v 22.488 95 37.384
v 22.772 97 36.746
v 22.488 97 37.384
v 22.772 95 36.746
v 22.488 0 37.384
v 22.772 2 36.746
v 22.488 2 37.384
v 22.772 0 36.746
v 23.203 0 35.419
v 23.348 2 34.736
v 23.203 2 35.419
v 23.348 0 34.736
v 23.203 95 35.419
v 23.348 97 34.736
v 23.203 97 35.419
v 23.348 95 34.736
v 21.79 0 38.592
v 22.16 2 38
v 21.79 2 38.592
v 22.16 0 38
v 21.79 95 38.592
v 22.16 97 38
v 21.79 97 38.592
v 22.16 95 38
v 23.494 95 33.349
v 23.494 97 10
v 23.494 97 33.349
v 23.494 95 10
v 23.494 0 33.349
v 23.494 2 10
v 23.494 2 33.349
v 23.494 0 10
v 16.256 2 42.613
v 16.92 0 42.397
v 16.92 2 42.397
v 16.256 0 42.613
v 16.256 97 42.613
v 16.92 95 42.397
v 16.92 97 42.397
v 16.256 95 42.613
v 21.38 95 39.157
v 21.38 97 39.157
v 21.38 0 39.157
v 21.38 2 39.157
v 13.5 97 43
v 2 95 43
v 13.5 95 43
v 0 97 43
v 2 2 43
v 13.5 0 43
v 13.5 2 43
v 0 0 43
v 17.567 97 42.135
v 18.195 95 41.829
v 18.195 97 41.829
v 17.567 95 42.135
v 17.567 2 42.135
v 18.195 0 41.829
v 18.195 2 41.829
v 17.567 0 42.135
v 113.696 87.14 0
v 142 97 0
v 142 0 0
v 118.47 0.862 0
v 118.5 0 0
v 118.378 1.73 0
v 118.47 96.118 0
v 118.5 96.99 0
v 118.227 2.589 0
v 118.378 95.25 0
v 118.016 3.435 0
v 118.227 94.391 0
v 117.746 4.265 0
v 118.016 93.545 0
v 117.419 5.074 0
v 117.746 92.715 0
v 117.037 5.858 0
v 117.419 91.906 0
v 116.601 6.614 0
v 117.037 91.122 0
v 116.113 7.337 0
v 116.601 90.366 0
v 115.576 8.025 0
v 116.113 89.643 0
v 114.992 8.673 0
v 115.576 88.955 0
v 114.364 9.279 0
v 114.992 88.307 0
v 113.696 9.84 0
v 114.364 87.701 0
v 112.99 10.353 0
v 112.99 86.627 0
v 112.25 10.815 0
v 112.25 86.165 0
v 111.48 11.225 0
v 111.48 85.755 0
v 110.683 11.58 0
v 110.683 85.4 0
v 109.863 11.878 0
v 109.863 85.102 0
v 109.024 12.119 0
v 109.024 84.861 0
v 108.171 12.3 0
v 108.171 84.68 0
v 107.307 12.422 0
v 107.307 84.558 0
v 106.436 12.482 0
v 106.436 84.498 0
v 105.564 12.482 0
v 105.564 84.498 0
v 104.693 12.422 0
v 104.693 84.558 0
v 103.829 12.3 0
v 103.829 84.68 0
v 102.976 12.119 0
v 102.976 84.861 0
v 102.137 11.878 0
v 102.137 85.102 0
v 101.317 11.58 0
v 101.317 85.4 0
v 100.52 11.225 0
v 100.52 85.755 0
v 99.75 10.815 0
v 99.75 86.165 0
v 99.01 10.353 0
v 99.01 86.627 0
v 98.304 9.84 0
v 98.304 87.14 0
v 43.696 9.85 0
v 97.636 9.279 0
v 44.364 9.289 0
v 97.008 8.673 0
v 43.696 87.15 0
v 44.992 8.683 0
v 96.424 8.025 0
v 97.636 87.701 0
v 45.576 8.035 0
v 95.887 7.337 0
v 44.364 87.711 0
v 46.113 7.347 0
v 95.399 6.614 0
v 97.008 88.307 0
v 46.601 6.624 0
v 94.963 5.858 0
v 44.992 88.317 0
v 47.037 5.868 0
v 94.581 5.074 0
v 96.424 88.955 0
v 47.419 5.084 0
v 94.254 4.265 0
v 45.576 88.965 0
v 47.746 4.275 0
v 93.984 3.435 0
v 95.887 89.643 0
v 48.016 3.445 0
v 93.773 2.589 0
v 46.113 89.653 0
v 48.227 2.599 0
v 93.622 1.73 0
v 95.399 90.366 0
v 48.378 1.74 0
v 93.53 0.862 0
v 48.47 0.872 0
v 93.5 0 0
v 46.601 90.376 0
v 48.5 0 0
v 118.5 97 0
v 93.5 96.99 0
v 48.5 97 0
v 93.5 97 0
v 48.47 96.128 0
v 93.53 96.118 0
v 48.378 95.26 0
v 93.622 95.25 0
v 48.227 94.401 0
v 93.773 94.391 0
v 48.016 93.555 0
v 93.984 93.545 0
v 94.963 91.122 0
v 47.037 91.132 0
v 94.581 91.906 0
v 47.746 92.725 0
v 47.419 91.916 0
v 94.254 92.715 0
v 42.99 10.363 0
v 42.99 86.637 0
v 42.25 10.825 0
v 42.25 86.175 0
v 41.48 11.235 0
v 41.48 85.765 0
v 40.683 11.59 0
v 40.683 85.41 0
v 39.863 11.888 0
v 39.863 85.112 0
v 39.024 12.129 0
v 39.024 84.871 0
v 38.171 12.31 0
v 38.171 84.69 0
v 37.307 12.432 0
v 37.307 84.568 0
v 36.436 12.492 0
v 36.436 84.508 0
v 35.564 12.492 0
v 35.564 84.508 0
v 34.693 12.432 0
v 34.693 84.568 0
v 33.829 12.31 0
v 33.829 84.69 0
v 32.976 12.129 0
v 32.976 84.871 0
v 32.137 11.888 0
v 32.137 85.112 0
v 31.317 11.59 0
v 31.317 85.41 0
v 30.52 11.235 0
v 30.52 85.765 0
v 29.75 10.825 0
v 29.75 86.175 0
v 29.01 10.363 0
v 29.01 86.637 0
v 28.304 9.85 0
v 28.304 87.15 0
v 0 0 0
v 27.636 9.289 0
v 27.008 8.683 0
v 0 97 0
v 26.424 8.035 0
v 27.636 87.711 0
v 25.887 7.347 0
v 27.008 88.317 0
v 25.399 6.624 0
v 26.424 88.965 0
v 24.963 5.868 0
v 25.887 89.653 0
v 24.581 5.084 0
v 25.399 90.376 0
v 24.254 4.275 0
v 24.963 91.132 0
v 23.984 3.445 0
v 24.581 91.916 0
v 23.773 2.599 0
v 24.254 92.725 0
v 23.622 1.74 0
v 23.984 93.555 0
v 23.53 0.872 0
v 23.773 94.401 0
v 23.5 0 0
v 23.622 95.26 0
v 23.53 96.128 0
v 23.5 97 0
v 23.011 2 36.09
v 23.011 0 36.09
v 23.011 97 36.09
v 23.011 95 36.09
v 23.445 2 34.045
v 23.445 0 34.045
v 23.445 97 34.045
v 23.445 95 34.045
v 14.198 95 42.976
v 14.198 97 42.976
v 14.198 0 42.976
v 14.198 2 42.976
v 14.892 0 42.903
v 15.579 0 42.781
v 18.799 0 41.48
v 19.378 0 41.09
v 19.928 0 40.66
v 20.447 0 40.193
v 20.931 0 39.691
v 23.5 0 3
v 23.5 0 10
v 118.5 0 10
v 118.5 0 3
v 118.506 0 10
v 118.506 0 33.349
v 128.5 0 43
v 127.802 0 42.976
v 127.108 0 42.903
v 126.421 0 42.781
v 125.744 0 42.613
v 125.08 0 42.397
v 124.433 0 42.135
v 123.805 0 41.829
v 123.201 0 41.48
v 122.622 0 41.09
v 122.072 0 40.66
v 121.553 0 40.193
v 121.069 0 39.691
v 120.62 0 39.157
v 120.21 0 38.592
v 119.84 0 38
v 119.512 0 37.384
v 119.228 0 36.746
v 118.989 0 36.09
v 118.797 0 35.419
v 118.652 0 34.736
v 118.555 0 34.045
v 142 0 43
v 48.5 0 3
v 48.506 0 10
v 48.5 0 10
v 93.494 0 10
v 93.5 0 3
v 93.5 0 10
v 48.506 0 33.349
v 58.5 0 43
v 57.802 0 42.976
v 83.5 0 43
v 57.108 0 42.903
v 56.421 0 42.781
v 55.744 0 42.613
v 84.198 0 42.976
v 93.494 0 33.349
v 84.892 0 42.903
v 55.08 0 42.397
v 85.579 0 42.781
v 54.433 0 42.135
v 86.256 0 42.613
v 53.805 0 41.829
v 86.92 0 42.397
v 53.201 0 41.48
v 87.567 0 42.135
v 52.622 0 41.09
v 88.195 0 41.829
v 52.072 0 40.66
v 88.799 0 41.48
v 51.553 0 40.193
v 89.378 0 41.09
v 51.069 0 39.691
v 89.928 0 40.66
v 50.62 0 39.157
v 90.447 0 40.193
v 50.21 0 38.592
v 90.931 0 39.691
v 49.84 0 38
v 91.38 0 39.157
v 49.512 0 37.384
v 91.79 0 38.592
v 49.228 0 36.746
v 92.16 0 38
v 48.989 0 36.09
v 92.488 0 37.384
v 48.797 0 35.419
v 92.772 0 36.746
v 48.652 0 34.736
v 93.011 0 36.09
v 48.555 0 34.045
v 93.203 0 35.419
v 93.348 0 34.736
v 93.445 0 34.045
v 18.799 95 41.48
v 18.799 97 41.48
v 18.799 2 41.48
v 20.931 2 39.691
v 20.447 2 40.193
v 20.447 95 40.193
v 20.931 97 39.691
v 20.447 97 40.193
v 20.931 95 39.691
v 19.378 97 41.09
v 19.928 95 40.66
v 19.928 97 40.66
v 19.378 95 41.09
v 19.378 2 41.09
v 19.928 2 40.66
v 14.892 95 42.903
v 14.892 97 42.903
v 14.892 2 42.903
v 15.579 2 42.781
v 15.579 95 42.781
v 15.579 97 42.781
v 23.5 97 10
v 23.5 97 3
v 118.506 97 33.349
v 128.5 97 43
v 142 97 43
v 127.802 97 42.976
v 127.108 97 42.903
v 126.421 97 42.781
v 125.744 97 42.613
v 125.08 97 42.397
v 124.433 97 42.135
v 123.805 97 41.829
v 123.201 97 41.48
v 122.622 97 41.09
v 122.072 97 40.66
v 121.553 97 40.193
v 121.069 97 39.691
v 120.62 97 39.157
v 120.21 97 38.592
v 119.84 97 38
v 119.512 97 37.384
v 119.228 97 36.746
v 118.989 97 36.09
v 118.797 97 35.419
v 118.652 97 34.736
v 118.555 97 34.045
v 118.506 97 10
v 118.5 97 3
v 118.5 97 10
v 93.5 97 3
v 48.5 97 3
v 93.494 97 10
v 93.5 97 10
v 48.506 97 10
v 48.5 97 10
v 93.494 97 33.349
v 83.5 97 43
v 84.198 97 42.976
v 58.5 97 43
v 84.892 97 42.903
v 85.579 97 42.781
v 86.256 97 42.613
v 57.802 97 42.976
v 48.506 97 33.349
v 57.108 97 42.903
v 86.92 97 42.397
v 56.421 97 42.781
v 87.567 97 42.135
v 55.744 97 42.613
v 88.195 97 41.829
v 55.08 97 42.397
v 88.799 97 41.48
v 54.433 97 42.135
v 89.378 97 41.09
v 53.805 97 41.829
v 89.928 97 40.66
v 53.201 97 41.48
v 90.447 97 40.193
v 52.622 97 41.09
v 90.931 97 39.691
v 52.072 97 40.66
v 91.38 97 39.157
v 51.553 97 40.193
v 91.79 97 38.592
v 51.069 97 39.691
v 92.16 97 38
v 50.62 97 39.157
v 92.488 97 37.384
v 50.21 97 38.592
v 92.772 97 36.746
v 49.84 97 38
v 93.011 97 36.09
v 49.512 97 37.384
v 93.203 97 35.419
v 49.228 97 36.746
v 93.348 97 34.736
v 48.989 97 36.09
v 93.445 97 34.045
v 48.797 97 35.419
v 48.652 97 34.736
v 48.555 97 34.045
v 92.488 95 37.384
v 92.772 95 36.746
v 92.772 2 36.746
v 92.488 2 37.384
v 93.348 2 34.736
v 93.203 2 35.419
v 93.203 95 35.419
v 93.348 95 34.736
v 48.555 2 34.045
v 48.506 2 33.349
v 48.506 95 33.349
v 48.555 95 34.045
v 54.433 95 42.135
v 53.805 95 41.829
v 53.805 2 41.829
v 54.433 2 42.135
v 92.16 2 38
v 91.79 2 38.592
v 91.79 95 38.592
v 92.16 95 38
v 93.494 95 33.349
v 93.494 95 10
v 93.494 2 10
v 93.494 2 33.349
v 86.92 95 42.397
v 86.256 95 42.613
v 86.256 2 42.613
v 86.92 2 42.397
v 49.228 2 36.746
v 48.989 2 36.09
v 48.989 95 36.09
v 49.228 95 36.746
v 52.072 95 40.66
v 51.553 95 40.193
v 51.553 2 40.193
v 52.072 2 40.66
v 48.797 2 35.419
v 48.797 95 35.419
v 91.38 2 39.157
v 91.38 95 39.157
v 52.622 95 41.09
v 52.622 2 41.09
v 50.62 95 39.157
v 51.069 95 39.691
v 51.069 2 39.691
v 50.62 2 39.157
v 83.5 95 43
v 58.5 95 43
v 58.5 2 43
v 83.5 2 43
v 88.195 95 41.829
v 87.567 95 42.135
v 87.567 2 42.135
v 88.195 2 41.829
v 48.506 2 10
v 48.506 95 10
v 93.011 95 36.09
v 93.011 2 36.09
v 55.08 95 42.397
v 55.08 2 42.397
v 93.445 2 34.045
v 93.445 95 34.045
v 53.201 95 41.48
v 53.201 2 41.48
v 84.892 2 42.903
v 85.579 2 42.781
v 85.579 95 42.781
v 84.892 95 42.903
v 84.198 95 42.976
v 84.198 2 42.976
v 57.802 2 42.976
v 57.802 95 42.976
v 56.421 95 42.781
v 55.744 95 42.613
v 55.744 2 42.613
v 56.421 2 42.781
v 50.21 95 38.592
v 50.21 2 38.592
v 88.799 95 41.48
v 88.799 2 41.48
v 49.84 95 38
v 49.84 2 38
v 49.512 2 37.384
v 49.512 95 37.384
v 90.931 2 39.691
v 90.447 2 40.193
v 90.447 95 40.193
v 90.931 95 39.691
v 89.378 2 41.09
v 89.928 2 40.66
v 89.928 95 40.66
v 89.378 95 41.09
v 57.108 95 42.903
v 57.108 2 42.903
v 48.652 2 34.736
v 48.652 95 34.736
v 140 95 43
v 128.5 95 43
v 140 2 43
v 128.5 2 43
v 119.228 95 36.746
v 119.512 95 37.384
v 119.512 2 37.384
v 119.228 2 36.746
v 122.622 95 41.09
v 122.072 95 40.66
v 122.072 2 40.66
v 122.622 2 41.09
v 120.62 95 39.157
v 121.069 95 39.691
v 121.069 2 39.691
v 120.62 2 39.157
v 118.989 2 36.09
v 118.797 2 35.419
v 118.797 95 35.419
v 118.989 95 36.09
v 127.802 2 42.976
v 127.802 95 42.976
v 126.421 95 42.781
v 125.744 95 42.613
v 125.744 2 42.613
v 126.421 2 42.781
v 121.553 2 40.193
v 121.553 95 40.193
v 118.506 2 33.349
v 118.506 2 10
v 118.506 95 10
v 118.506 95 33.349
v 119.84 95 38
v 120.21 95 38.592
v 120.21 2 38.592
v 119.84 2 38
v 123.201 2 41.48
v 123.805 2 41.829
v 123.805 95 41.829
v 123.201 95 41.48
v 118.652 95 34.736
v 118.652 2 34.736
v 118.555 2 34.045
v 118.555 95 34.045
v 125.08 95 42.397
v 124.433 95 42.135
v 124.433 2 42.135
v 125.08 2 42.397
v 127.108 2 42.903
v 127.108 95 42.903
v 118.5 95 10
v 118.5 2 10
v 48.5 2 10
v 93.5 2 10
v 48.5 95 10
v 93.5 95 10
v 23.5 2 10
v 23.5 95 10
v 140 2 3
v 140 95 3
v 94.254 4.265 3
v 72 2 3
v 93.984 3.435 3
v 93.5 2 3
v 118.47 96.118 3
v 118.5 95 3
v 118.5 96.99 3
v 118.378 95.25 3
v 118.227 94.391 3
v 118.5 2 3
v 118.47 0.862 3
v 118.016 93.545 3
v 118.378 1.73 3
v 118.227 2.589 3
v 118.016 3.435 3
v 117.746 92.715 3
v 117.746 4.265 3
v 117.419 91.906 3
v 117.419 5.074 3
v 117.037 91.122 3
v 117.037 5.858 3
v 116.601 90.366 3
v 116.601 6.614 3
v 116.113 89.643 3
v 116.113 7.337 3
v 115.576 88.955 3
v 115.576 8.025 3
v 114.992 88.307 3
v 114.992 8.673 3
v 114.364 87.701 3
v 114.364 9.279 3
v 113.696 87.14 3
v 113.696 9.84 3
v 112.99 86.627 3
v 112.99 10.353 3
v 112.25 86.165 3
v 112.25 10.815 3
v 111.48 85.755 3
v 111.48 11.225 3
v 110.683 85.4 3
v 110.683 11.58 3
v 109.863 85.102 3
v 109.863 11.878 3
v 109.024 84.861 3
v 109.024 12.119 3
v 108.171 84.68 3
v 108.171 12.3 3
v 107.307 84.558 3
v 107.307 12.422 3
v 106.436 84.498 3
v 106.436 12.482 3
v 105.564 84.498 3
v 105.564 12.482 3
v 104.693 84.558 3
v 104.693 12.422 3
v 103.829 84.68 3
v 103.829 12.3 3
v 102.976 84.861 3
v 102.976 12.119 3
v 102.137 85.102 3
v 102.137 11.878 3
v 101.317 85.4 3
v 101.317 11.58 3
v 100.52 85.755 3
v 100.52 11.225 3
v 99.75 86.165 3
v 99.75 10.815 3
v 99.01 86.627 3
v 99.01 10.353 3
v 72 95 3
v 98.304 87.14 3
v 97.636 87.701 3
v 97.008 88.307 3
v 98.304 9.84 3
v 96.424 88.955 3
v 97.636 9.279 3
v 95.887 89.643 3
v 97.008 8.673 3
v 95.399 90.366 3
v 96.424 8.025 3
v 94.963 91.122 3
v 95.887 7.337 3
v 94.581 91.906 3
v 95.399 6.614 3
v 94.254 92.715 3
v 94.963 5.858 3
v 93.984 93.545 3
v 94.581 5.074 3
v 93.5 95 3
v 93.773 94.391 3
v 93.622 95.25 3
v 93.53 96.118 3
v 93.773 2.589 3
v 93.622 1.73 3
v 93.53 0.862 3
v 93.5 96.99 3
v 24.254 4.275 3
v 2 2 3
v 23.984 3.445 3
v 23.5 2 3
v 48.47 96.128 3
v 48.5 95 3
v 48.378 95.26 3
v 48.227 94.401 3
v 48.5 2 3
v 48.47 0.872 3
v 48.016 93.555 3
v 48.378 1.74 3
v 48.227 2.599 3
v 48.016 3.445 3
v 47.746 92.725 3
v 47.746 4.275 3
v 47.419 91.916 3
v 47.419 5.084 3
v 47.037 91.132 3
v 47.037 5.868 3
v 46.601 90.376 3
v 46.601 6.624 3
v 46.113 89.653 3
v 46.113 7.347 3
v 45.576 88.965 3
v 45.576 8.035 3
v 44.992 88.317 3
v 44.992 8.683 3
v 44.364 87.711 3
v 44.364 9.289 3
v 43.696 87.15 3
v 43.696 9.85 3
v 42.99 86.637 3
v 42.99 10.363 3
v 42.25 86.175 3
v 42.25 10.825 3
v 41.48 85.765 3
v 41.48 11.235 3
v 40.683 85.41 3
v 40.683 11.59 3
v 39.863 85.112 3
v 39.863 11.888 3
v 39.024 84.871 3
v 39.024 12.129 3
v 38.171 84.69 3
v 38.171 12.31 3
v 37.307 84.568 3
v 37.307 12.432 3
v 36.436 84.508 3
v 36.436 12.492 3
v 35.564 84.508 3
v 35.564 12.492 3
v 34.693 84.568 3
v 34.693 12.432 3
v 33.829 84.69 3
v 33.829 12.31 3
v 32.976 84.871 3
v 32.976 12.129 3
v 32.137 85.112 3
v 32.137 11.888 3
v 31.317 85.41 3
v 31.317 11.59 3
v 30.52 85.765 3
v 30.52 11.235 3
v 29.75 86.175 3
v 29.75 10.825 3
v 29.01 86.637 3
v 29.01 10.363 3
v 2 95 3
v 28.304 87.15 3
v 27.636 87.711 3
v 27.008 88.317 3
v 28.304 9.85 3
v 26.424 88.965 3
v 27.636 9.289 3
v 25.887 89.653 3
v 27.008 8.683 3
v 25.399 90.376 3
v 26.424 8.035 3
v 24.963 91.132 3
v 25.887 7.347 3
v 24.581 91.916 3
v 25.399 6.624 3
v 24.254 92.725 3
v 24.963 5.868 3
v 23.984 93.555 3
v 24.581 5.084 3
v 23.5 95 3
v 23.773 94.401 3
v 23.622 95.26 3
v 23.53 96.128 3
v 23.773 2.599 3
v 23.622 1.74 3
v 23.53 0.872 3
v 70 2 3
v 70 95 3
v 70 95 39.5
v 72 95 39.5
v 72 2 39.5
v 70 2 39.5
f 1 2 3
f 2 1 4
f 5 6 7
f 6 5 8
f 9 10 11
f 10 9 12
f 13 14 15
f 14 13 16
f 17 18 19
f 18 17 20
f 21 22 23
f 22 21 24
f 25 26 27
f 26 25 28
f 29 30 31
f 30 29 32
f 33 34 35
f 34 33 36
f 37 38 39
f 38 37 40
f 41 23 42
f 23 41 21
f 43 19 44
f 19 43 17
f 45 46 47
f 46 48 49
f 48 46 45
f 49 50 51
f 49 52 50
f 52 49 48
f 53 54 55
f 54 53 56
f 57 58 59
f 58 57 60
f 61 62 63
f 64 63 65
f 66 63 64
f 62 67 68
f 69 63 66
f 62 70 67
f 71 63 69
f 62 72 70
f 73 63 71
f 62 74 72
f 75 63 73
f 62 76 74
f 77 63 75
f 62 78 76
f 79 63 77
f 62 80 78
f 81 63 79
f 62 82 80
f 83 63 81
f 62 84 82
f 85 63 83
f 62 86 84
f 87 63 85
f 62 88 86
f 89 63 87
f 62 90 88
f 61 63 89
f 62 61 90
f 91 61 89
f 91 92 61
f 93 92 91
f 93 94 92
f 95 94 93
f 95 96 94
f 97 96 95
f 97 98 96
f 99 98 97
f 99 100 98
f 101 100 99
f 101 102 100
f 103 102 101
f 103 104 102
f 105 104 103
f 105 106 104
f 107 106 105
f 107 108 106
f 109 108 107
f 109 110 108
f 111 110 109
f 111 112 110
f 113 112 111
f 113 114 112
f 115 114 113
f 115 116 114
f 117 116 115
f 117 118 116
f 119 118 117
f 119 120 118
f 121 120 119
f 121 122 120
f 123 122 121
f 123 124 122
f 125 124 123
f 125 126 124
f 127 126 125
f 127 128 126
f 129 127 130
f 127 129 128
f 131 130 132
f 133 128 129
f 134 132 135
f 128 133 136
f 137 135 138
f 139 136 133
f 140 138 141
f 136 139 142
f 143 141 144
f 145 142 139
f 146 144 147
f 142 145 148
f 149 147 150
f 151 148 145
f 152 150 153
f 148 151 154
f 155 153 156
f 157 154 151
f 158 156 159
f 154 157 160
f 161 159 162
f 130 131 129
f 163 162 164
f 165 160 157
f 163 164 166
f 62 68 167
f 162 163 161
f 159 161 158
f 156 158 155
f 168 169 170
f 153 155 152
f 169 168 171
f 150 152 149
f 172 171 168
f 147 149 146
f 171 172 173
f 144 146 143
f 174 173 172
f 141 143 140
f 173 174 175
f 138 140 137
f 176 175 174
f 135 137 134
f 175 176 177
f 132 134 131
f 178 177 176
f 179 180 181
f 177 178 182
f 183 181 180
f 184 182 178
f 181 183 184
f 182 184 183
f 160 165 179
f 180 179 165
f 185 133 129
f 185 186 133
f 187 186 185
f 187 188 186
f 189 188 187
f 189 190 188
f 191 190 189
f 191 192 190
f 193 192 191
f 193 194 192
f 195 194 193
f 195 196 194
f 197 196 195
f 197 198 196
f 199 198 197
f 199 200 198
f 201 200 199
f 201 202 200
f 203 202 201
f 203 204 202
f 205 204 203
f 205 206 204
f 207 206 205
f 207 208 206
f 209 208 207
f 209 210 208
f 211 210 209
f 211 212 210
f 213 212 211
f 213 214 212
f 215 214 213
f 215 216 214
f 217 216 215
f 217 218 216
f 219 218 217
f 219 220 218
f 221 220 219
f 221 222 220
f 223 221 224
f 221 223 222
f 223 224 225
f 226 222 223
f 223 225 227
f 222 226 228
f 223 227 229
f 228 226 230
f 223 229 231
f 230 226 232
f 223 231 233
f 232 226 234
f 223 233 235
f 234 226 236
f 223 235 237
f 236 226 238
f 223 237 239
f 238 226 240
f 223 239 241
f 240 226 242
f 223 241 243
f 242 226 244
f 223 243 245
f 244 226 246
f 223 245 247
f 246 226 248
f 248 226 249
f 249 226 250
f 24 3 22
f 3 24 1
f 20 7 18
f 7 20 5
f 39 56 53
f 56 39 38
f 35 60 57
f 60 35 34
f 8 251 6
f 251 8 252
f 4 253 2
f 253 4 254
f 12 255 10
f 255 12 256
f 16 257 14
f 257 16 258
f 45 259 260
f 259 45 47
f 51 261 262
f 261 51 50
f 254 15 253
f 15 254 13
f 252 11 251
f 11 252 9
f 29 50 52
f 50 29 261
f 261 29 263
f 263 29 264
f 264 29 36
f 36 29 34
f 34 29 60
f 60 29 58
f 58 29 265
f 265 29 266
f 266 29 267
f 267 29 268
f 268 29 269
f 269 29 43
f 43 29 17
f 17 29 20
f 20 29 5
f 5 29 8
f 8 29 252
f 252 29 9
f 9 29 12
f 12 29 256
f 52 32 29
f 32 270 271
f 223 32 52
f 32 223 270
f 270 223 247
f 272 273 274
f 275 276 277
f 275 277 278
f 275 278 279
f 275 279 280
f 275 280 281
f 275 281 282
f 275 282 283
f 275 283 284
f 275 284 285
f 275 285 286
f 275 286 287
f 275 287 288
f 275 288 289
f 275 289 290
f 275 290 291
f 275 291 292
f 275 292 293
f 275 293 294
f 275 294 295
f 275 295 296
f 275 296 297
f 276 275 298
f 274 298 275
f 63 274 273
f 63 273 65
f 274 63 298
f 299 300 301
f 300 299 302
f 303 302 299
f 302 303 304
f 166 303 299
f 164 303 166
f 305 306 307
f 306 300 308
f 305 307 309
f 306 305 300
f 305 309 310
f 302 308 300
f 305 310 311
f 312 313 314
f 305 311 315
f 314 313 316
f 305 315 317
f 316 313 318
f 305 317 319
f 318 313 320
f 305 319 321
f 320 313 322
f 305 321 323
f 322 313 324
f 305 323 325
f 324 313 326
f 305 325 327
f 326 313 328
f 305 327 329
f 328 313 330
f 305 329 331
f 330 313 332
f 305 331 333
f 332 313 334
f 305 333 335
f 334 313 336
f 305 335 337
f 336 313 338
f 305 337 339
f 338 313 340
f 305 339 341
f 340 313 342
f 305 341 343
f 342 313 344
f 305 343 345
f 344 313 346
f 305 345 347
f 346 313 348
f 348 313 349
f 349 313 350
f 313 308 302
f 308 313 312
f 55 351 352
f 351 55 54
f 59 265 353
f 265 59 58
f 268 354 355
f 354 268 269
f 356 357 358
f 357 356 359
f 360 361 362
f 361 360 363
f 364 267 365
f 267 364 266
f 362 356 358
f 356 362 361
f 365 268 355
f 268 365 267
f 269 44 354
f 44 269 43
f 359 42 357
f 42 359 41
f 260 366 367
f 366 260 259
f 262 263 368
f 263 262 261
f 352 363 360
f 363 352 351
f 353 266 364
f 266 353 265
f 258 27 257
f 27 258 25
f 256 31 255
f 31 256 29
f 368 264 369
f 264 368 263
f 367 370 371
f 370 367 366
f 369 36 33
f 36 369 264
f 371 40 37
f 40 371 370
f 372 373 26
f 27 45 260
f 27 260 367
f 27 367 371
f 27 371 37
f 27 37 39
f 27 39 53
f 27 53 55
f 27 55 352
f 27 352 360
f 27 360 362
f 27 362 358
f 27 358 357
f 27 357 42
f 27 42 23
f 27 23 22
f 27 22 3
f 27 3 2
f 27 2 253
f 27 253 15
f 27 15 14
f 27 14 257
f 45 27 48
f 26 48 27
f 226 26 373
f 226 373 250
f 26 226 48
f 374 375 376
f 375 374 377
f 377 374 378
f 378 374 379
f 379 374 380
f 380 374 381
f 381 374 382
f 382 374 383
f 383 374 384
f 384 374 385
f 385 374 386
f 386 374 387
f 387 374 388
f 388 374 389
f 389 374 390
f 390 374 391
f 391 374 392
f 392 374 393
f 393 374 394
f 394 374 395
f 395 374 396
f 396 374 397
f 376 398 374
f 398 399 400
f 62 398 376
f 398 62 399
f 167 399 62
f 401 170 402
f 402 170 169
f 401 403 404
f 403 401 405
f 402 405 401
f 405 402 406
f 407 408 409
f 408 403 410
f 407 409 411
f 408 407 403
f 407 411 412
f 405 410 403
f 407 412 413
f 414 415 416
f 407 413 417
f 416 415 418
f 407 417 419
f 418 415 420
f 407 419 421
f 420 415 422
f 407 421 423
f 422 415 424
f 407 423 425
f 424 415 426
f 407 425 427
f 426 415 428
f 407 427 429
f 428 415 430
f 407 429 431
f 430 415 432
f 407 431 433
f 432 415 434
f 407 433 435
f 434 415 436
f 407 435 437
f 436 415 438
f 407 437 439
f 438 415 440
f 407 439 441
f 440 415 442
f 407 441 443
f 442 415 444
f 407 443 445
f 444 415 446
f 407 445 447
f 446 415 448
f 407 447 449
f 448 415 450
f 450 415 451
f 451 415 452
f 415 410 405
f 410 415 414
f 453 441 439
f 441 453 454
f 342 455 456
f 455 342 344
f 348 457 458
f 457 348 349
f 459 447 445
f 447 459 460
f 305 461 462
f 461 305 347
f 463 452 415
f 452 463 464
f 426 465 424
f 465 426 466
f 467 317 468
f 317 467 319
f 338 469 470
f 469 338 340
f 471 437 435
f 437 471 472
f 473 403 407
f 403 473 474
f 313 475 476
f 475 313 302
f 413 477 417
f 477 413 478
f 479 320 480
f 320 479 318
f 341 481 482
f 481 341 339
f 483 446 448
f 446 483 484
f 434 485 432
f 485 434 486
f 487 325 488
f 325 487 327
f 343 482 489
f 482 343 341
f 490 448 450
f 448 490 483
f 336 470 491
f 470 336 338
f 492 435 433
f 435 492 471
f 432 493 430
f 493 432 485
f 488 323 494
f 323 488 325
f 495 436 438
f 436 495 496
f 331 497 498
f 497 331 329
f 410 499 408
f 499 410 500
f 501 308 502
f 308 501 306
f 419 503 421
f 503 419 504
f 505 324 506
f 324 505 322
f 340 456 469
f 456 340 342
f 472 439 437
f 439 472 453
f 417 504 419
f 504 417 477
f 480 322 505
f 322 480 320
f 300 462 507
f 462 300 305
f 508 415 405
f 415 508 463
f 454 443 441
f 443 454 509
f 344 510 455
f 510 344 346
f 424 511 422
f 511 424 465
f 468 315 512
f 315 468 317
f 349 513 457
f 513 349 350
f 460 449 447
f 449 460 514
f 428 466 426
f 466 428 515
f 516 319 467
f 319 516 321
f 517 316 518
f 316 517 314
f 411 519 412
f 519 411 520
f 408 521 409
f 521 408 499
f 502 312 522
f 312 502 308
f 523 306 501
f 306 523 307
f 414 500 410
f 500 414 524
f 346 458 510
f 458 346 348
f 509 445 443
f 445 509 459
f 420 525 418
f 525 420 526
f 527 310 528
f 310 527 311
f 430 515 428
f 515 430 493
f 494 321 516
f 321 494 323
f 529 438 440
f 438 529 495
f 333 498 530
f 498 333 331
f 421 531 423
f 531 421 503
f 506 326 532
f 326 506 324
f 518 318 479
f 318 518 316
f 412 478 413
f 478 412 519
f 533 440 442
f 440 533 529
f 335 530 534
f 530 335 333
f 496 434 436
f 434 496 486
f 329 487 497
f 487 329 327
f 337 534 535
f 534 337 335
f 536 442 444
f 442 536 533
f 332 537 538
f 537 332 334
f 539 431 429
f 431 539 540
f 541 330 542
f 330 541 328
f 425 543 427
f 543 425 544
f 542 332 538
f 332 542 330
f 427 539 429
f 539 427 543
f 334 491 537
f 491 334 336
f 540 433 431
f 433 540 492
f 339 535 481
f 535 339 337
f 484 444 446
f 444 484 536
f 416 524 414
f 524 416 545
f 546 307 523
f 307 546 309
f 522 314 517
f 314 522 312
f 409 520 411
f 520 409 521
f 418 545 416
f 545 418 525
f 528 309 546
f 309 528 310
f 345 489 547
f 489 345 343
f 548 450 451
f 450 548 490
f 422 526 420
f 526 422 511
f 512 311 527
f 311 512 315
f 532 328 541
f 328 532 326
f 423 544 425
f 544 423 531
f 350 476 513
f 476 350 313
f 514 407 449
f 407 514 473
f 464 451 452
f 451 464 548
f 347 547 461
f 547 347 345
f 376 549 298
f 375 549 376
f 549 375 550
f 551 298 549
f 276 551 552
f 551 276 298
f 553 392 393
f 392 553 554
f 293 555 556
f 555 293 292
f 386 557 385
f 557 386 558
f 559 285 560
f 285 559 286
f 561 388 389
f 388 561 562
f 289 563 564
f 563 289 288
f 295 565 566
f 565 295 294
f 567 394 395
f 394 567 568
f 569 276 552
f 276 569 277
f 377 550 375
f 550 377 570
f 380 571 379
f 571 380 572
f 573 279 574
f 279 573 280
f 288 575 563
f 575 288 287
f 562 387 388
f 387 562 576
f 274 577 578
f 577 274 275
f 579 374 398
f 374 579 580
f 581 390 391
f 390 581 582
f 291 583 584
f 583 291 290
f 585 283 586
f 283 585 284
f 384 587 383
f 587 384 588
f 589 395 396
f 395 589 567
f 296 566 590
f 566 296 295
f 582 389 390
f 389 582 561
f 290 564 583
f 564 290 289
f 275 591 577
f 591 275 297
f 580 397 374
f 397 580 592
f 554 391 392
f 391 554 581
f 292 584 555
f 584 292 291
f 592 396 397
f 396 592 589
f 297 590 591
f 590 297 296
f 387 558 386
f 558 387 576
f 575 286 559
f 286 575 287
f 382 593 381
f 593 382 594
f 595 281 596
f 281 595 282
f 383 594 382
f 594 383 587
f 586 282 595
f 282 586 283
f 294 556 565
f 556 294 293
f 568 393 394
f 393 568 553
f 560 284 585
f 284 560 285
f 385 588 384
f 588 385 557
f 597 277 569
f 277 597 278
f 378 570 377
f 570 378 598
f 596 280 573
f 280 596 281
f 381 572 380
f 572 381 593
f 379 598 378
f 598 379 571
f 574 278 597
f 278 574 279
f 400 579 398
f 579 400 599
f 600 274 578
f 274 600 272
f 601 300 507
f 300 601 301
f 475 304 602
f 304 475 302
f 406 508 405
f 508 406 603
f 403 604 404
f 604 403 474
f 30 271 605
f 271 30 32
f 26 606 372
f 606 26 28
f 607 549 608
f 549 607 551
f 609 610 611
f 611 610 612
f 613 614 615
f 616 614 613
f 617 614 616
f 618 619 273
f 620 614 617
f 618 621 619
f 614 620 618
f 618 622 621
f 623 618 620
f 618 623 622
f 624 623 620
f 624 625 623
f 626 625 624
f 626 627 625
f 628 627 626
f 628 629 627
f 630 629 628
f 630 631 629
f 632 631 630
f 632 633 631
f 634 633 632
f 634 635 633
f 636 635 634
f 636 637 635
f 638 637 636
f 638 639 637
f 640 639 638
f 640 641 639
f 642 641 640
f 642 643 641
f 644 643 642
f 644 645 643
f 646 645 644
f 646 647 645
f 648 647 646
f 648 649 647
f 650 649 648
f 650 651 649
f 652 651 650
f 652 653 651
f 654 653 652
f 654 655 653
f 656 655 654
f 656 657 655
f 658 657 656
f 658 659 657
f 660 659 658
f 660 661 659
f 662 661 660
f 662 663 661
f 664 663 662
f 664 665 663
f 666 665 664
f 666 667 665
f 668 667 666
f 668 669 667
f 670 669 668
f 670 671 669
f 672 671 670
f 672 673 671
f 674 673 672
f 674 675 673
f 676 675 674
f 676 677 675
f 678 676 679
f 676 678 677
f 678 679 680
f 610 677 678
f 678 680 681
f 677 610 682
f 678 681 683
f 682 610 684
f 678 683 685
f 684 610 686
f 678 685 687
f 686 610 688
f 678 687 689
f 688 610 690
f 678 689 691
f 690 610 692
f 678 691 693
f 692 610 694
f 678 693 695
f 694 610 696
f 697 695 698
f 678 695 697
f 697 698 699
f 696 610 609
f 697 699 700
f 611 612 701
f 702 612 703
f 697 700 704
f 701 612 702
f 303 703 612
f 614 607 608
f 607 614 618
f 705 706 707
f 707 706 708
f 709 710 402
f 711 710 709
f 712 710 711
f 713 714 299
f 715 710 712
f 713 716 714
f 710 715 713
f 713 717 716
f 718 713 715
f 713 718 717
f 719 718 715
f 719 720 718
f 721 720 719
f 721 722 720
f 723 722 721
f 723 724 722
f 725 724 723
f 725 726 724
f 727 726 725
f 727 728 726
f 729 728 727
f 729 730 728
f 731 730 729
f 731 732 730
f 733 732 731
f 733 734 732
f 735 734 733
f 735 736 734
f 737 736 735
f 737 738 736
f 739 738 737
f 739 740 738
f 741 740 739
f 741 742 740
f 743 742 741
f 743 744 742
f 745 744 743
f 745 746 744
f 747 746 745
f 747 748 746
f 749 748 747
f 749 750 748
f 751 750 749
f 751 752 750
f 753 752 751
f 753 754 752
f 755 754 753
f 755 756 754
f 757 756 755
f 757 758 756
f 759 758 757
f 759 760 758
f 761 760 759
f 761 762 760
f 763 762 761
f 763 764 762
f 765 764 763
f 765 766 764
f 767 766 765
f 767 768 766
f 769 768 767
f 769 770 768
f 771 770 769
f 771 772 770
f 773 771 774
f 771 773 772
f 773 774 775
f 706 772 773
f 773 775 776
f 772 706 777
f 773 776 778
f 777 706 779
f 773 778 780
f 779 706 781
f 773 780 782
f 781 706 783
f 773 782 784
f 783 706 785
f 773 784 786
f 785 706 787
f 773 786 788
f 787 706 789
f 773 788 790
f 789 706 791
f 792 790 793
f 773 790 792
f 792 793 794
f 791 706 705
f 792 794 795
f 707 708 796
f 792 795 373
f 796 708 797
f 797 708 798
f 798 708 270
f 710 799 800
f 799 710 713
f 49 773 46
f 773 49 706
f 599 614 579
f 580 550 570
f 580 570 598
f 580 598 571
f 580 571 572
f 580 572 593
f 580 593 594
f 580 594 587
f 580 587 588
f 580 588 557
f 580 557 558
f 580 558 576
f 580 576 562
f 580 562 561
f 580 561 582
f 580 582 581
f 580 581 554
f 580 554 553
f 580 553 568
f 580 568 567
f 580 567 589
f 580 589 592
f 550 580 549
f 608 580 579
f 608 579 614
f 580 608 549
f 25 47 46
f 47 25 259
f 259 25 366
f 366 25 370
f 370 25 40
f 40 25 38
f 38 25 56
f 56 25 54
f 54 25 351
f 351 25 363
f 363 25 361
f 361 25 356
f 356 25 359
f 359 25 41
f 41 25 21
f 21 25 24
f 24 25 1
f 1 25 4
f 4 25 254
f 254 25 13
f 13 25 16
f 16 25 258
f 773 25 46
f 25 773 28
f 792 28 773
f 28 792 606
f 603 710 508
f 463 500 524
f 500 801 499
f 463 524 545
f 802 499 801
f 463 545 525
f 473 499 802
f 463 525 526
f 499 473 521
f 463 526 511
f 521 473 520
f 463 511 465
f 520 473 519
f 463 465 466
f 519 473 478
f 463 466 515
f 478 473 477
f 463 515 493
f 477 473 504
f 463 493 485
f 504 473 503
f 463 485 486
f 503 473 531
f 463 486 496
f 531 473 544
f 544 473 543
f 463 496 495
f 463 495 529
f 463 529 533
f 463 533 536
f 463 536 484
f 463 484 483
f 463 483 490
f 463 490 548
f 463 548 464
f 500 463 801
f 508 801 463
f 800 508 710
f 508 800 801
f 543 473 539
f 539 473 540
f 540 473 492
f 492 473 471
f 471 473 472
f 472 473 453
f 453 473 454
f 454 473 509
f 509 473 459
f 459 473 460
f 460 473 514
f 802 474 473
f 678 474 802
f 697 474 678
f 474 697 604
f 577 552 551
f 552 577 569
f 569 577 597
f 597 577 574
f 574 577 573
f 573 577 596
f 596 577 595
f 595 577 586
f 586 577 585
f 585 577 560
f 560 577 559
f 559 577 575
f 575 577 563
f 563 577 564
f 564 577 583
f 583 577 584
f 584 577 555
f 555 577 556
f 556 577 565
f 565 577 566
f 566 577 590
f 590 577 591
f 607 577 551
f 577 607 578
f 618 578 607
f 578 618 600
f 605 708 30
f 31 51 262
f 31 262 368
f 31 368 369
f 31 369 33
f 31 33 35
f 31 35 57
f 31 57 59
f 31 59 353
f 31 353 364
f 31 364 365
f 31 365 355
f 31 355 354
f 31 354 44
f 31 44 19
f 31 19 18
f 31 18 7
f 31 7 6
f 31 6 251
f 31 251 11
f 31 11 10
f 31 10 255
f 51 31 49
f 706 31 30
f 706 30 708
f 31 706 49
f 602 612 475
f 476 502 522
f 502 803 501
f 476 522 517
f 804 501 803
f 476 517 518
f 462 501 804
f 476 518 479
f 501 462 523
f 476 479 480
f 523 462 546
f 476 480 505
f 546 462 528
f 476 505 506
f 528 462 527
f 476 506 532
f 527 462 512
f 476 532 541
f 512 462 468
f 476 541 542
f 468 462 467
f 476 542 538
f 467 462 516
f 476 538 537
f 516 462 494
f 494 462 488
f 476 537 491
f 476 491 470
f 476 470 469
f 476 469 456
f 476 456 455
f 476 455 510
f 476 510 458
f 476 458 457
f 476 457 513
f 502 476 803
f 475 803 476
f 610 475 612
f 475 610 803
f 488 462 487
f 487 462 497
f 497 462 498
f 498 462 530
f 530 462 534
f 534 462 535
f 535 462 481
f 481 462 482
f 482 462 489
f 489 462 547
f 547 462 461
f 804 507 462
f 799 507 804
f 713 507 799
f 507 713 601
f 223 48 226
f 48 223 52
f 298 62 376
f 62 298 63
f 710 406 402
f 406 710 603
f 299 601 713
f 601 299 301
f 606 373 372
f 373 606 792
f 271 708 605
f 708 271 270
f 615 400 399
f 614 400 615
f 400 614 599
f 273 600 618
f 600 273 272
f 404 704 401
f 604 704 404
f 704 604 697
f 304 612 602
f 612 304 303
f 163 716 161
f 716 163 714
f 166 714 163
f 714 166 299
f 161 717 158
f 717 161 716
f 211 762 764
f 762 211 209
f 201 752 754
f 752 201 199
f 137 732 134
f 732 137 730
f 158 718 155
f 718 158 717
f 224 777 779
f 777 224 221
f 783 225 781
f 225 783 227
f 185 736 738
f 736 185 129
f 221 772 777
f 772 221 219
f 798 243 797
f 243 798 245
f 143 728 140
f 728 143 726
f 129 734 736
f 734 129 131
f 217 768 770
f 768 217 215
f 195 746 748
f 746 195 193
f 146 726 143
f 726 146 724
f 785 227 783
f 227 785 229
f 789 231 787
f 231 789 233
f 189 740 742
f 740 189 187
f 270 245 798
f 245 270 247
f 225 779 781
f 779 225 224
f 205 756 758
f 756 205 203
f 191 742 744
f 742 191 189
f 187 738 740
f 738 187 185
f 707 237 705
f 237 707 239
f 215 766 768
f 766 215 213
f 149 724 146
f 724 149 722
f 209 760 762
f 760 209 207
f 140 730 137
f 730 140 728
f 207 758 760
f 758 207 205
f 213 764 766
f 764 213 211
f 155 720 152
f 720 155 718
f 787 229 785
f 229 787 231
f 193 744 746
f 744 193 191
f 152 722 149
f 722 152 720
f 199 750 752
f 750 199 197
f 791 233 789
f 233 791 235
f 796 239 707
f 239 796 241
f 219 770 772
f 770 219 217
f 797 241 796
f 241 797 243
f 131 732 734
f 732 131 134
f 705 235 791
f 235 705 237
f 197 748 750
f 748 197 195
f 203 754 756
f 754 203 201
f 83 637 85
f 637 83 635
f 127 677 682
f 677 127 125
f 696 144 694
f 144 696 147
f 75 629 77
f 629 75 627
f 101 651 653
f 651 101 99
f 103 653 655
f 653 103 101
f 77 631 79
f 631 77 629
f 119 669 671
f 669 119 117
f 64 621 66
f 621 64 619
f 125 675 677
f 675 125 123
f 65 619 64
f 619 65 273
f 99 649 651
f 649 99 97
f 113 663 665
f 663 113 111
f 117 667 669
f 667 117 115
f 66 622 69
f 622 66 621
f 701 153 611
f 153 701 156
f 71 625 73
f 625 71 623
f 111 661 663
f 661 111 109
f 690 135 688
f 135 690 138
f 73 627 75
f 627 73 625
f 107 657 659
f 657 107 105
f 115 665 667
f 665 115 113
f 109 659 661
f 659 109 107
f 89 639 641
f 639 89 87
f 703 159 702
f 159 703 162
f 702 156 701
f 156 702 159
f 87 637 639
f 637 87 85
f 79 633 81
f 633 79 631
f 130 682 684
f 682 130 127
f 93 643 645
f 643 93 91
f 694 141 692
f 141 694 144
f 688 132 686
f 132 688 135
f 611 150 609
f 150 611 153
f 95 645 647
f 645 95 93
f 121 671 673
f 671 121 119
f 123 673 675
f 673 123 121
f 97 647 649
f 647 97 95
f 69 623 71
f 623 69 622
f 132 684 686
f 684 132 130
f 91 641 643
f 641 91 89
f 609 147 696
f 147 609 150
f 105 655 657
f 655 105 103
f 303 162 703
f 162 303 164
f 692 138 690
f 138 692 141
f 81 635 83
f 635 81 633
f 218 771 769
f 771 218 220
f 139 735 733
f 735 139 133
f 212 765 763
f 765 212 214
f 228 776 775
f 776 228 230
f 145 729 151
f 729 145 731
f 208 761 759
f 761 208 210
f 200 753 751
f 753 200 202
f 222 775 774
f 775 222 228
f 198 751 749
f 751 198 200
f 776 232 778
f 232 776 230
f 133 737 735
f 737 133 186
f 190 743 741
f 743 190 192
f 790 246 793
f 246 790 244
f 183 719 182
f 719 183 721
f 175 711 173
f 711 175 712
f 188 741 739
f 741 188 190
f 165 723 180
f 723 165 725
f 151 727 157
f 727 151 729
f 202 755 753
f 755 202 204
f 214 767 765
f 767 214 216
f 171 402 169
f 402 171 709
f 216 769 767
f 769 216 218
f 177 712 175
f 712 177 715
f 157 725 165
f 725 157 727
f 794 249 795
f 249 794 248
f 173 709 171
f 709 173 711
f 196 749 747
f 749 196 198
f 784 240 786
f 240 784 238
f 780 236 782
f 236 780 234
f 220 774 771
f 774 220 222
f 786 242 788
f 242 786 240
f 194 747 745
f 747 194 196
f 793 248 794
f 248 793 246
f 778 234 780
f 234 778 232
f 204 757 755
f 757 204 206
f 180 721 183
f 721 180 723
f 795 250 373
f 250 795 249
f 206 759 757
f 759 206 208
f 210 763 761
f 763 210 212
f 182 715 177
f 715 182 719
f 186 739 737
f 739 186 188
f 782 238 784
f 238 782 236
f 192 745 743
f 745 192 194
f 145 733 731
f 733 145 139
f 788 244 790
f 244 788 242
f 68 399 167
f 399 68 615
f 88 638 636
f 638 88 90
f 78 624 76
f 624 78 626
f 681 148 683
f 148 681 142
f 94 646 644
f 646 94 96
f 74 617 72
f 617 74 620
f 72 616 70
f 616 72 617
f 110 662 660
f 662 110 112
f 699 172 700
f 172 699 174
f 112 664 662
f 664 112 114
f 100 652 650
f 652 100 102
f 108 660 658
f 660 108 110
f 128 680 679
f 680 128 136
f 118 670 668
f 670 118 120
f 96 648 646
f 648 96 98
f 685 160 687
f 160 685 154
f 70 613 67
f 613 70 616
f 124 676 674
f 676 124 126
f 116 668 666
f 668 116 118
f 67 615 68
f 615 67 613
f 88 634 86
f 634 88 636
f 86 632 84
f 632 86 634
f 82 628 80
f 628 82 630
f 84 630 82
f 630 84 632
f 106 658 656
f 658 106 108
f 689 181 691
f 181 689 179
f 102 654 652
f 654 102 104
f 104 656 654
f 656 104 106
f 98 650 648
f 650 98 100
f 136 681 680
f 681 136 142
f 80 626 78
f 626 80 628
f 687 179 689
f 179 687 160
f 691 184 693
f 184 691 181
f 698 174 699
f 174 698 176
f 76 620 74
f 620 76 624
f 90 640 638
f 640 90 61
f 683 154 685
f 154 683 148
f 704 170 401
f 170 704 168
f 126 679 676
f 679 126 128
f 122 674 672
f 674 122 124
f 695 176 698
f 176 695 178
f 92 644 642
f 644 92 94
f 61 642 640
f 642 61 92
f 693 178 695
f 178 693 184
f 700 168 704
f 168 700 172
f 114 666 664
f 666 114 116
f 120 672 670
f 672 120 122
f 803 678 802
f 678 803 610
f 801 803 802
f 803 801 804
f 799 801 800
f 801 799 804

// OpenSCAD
// file: Parameters.scad
// ADJUSTABLE STUFF
// ALL VALUES ARE IN MILLIMETERS
// If you want the tray to slide out to the left, leave this as "0".
// If you want the tray to slide out to the right, set this to "180.
logoOrientation = 0;

// if you want the semi-circular cutouts to be bigger or smaller,
// adjust this value.
cutoutWidth = 25;

// If you want the curved corners on the tray to be smaller, reduce this
// number.  
cutoutRadius = 10;

// Quality of the smei-circular cutouts.  The higher the number, the
// smoother the curve.  If you're playing around in OpenSCAD to tweak the
// design, drop this to 10 for faster rendering.
facets = 90;

// These control the size of the card wells.  I use Mayday Premium
// sleeves, so adjust these if you're using a different sleeve.
crdW = 68;                  // width of card well, x axis
crdL = 93;                  // length of card well, y axis
crdH = 40;                  // height of card well, z axis

// Thickness of the sleeve wall
sleeveWall = 2;

// Thickness of the bottom of the tray.  I found 2 to be a little bendy.
bottom = 3;                 

// Thickness of the tray walls.
wall = 2;

// This controls how much height will be cut from the wall between the two
// card wells.  This creates space for the game manual.
manual = 3.5;

// This is for the padding between the tray and the sleeve. 
// If you find that the fit is too loose or too light for your taste,
// adjust this value accordingly.
padding = 0.5;     

// MAKING ADJUSTMENTS BELOW THIS POINT IS NOT ADVISED
trayX = (wall*3)+(crdW*2);
trayY = (wall*2)+crdL;
trayZ = crdH+bottom;
cutoutRemainder = (crdW-cutoutWidth)/2;
sleeveX = trayX + sleeveWall + padding +2;   
sleeveY = trayY + (2*sleeveWall) + (2*padding);
sleeveZ = trayZ + (2*sleeveWall) + (2*padding);

// padding used to prevent coincident faces in OpenSCAD at render time
_min = .01;    
_max = 100;
// file: ../lib/roundedcube.scad
//
// Dan Upshaw built this module and graciously granted his permission
// for inclusion in this repository.
// The code itself can be found at
// https://danielupshaw.com/openscad-rounded-corners/
// Higher definition curves
$fs = 0.01;

module roundedcube(size = [1, 1, 1], center = false, radius = 0.5, apply_to = "all") {
	// If single value, convert to [x, y, z] vector
	size = (size[0] == undef) ? [size, size, size] : size;

	translate_min = radius;
	translate_xmax = size[0] - radius;
	translate_ymax = size[1] - radius;
	translate_zmax = size[2] - radius;

	diameter = radius * 2;

	module build_point(type = "sphere", rotate = [0, 0, 0]) {
		if (type == "sphere") {
			sphere(r = radius);
		} else if (type == "cylinder") {
			rotate(a = rotate)
			cylinder(h = diameter, r = radius, center = true, $fn=90);
		}
	}

	obj_translate = (center == false) ?
		[0, 0, 0] : [
			-(size[0] / 2),
			-(size[1] / 2),
			-(size[2] / 2)
		];

	translate(v = obj_translate) {
		hull() {
			for (translate_x = [translate_min, translate_xmax]) {
				x_at = (translate_x == translate_min) ? "min" : "max";
				for (translate_y = [translate_min, translate_ymax]) {
					y_at = (translate_y == translate_min) ? "min" : "max";
					for (translate_z = [translate_min, translate_zmax]) {
						z_at = (translate_z == translate_min) ? "min" : "max";

						translate(v = [translate_x, translate_y, translate_z])
						if (
							(apply_to == "all") ||
							(apply_to == "xmin" && x_at == "min") || (apply_to == "xmax" && x_at == "max") ||
							(apply_to == "ymin" && y_at == "min") || (apply_to == "ymax" && y_at == "max") ||
							(apply_to == "zmin" && z_at == "min") || (apply_to == "zmax" && z_at == "max")
						) {
							build_point("sphere");
						} else {
							rotate = 
								(apply_to == "xmin" || apply_to == "xmax" || apply_to == "x") ? [0, 90, 0] : (
								(apply_to == "ymin" || apply_to == "ymax" || apply_to == "y") ? [90, 90, 0] :
								[0, 0, 0]
							);
							build_point("cylinder", rotate);
						}
					}
				}
			}
		}
	}
}
// main file
use <../lib/roundedcube.scad>
include <Parameters.scad>

difference()
{
    //tray base
    union()
    {
        translate([-cutoutRemainder,0,0])
            roundedcube([(cutoutRemainder*2)+wall,trayY,trayZ], false,cutoutRadius,"y");

        translate([crdW-cutoutRemainder+wall,0,0])
            roundedcube([(cutoutRemainder*2)+wall,trayY,trayZ], false,cutoutRadius,"y");

        translate([(3*cutoutRemainder)+(2*cutoutWidth)+(2*wall),0,0])
            roundedcube([(cutoutRemainder*2),trayY,trayZ], false,cutoutRadius,"y");
            
        cube([trayX, trayY, cutoutRadius]);
    }
    //end tray base
    
    // interior
    translate([wall,wall,bottom])
    cube([trayX-(2*wall),trayY-(2*wall),_max]);
    
    //end pieces
    translate([-_max,-_min,-_min])
    cube([_max,_max,_max]);
    translate([trayX,-_min,-_min])
    cube([_max,_max,_max]);

    // cutouts down to bottom
    translate([cutoutRemainder+wall,0-_min,bottom])
    cube([cutoutWidth,_max,_max]);

    translate([(3*cutoutRemainder)+cutoutWidth+(2*wall),0-_min,bottom])
    cube([cutoutWidth,_max,_max]);
    
    // fingerholes in bottom
    translate([wall+cutoutRemainder+(cutoutWidth/2),0,0-_min])
    cylinder(h=bottom+(2*_min), r1=(cutoutWidth/2), r2=(cutoutWidth/2), $fn=facets);

    translate([(3*cutoutRemainder)+cutoutWidth+(2*wall)+(cutoutWidth/2),0-_min,0-_min])
    cylinder(h=bottom+(2*_min), r1=(cutoutWidth/2), r2=(cutoutWidth/2), $fn=facets);

    translate([wall+cutoutRemainder+(cutoutWidth/2),trayY,0-_min])
    cylinder(h=bottom+(2*_min), r1=(cutoutWidth/2), r2=(cutoutWidth/2), $fn=facets);

    translate([(3*cutoutRemainder)+cutoutWidth+(2*wall)+(cutoutWidth/2),trayY-_min,0-_min])
    cylinder(h=bottom+(2*_min), r1=(cutoutWidth/2), r2=(cutoutWidth/2), $fn=facets);

}

// middle wall
translate([wall+crdW,0,bottom])
cube([wall,trayY,trayZ-manual-bottom]);
